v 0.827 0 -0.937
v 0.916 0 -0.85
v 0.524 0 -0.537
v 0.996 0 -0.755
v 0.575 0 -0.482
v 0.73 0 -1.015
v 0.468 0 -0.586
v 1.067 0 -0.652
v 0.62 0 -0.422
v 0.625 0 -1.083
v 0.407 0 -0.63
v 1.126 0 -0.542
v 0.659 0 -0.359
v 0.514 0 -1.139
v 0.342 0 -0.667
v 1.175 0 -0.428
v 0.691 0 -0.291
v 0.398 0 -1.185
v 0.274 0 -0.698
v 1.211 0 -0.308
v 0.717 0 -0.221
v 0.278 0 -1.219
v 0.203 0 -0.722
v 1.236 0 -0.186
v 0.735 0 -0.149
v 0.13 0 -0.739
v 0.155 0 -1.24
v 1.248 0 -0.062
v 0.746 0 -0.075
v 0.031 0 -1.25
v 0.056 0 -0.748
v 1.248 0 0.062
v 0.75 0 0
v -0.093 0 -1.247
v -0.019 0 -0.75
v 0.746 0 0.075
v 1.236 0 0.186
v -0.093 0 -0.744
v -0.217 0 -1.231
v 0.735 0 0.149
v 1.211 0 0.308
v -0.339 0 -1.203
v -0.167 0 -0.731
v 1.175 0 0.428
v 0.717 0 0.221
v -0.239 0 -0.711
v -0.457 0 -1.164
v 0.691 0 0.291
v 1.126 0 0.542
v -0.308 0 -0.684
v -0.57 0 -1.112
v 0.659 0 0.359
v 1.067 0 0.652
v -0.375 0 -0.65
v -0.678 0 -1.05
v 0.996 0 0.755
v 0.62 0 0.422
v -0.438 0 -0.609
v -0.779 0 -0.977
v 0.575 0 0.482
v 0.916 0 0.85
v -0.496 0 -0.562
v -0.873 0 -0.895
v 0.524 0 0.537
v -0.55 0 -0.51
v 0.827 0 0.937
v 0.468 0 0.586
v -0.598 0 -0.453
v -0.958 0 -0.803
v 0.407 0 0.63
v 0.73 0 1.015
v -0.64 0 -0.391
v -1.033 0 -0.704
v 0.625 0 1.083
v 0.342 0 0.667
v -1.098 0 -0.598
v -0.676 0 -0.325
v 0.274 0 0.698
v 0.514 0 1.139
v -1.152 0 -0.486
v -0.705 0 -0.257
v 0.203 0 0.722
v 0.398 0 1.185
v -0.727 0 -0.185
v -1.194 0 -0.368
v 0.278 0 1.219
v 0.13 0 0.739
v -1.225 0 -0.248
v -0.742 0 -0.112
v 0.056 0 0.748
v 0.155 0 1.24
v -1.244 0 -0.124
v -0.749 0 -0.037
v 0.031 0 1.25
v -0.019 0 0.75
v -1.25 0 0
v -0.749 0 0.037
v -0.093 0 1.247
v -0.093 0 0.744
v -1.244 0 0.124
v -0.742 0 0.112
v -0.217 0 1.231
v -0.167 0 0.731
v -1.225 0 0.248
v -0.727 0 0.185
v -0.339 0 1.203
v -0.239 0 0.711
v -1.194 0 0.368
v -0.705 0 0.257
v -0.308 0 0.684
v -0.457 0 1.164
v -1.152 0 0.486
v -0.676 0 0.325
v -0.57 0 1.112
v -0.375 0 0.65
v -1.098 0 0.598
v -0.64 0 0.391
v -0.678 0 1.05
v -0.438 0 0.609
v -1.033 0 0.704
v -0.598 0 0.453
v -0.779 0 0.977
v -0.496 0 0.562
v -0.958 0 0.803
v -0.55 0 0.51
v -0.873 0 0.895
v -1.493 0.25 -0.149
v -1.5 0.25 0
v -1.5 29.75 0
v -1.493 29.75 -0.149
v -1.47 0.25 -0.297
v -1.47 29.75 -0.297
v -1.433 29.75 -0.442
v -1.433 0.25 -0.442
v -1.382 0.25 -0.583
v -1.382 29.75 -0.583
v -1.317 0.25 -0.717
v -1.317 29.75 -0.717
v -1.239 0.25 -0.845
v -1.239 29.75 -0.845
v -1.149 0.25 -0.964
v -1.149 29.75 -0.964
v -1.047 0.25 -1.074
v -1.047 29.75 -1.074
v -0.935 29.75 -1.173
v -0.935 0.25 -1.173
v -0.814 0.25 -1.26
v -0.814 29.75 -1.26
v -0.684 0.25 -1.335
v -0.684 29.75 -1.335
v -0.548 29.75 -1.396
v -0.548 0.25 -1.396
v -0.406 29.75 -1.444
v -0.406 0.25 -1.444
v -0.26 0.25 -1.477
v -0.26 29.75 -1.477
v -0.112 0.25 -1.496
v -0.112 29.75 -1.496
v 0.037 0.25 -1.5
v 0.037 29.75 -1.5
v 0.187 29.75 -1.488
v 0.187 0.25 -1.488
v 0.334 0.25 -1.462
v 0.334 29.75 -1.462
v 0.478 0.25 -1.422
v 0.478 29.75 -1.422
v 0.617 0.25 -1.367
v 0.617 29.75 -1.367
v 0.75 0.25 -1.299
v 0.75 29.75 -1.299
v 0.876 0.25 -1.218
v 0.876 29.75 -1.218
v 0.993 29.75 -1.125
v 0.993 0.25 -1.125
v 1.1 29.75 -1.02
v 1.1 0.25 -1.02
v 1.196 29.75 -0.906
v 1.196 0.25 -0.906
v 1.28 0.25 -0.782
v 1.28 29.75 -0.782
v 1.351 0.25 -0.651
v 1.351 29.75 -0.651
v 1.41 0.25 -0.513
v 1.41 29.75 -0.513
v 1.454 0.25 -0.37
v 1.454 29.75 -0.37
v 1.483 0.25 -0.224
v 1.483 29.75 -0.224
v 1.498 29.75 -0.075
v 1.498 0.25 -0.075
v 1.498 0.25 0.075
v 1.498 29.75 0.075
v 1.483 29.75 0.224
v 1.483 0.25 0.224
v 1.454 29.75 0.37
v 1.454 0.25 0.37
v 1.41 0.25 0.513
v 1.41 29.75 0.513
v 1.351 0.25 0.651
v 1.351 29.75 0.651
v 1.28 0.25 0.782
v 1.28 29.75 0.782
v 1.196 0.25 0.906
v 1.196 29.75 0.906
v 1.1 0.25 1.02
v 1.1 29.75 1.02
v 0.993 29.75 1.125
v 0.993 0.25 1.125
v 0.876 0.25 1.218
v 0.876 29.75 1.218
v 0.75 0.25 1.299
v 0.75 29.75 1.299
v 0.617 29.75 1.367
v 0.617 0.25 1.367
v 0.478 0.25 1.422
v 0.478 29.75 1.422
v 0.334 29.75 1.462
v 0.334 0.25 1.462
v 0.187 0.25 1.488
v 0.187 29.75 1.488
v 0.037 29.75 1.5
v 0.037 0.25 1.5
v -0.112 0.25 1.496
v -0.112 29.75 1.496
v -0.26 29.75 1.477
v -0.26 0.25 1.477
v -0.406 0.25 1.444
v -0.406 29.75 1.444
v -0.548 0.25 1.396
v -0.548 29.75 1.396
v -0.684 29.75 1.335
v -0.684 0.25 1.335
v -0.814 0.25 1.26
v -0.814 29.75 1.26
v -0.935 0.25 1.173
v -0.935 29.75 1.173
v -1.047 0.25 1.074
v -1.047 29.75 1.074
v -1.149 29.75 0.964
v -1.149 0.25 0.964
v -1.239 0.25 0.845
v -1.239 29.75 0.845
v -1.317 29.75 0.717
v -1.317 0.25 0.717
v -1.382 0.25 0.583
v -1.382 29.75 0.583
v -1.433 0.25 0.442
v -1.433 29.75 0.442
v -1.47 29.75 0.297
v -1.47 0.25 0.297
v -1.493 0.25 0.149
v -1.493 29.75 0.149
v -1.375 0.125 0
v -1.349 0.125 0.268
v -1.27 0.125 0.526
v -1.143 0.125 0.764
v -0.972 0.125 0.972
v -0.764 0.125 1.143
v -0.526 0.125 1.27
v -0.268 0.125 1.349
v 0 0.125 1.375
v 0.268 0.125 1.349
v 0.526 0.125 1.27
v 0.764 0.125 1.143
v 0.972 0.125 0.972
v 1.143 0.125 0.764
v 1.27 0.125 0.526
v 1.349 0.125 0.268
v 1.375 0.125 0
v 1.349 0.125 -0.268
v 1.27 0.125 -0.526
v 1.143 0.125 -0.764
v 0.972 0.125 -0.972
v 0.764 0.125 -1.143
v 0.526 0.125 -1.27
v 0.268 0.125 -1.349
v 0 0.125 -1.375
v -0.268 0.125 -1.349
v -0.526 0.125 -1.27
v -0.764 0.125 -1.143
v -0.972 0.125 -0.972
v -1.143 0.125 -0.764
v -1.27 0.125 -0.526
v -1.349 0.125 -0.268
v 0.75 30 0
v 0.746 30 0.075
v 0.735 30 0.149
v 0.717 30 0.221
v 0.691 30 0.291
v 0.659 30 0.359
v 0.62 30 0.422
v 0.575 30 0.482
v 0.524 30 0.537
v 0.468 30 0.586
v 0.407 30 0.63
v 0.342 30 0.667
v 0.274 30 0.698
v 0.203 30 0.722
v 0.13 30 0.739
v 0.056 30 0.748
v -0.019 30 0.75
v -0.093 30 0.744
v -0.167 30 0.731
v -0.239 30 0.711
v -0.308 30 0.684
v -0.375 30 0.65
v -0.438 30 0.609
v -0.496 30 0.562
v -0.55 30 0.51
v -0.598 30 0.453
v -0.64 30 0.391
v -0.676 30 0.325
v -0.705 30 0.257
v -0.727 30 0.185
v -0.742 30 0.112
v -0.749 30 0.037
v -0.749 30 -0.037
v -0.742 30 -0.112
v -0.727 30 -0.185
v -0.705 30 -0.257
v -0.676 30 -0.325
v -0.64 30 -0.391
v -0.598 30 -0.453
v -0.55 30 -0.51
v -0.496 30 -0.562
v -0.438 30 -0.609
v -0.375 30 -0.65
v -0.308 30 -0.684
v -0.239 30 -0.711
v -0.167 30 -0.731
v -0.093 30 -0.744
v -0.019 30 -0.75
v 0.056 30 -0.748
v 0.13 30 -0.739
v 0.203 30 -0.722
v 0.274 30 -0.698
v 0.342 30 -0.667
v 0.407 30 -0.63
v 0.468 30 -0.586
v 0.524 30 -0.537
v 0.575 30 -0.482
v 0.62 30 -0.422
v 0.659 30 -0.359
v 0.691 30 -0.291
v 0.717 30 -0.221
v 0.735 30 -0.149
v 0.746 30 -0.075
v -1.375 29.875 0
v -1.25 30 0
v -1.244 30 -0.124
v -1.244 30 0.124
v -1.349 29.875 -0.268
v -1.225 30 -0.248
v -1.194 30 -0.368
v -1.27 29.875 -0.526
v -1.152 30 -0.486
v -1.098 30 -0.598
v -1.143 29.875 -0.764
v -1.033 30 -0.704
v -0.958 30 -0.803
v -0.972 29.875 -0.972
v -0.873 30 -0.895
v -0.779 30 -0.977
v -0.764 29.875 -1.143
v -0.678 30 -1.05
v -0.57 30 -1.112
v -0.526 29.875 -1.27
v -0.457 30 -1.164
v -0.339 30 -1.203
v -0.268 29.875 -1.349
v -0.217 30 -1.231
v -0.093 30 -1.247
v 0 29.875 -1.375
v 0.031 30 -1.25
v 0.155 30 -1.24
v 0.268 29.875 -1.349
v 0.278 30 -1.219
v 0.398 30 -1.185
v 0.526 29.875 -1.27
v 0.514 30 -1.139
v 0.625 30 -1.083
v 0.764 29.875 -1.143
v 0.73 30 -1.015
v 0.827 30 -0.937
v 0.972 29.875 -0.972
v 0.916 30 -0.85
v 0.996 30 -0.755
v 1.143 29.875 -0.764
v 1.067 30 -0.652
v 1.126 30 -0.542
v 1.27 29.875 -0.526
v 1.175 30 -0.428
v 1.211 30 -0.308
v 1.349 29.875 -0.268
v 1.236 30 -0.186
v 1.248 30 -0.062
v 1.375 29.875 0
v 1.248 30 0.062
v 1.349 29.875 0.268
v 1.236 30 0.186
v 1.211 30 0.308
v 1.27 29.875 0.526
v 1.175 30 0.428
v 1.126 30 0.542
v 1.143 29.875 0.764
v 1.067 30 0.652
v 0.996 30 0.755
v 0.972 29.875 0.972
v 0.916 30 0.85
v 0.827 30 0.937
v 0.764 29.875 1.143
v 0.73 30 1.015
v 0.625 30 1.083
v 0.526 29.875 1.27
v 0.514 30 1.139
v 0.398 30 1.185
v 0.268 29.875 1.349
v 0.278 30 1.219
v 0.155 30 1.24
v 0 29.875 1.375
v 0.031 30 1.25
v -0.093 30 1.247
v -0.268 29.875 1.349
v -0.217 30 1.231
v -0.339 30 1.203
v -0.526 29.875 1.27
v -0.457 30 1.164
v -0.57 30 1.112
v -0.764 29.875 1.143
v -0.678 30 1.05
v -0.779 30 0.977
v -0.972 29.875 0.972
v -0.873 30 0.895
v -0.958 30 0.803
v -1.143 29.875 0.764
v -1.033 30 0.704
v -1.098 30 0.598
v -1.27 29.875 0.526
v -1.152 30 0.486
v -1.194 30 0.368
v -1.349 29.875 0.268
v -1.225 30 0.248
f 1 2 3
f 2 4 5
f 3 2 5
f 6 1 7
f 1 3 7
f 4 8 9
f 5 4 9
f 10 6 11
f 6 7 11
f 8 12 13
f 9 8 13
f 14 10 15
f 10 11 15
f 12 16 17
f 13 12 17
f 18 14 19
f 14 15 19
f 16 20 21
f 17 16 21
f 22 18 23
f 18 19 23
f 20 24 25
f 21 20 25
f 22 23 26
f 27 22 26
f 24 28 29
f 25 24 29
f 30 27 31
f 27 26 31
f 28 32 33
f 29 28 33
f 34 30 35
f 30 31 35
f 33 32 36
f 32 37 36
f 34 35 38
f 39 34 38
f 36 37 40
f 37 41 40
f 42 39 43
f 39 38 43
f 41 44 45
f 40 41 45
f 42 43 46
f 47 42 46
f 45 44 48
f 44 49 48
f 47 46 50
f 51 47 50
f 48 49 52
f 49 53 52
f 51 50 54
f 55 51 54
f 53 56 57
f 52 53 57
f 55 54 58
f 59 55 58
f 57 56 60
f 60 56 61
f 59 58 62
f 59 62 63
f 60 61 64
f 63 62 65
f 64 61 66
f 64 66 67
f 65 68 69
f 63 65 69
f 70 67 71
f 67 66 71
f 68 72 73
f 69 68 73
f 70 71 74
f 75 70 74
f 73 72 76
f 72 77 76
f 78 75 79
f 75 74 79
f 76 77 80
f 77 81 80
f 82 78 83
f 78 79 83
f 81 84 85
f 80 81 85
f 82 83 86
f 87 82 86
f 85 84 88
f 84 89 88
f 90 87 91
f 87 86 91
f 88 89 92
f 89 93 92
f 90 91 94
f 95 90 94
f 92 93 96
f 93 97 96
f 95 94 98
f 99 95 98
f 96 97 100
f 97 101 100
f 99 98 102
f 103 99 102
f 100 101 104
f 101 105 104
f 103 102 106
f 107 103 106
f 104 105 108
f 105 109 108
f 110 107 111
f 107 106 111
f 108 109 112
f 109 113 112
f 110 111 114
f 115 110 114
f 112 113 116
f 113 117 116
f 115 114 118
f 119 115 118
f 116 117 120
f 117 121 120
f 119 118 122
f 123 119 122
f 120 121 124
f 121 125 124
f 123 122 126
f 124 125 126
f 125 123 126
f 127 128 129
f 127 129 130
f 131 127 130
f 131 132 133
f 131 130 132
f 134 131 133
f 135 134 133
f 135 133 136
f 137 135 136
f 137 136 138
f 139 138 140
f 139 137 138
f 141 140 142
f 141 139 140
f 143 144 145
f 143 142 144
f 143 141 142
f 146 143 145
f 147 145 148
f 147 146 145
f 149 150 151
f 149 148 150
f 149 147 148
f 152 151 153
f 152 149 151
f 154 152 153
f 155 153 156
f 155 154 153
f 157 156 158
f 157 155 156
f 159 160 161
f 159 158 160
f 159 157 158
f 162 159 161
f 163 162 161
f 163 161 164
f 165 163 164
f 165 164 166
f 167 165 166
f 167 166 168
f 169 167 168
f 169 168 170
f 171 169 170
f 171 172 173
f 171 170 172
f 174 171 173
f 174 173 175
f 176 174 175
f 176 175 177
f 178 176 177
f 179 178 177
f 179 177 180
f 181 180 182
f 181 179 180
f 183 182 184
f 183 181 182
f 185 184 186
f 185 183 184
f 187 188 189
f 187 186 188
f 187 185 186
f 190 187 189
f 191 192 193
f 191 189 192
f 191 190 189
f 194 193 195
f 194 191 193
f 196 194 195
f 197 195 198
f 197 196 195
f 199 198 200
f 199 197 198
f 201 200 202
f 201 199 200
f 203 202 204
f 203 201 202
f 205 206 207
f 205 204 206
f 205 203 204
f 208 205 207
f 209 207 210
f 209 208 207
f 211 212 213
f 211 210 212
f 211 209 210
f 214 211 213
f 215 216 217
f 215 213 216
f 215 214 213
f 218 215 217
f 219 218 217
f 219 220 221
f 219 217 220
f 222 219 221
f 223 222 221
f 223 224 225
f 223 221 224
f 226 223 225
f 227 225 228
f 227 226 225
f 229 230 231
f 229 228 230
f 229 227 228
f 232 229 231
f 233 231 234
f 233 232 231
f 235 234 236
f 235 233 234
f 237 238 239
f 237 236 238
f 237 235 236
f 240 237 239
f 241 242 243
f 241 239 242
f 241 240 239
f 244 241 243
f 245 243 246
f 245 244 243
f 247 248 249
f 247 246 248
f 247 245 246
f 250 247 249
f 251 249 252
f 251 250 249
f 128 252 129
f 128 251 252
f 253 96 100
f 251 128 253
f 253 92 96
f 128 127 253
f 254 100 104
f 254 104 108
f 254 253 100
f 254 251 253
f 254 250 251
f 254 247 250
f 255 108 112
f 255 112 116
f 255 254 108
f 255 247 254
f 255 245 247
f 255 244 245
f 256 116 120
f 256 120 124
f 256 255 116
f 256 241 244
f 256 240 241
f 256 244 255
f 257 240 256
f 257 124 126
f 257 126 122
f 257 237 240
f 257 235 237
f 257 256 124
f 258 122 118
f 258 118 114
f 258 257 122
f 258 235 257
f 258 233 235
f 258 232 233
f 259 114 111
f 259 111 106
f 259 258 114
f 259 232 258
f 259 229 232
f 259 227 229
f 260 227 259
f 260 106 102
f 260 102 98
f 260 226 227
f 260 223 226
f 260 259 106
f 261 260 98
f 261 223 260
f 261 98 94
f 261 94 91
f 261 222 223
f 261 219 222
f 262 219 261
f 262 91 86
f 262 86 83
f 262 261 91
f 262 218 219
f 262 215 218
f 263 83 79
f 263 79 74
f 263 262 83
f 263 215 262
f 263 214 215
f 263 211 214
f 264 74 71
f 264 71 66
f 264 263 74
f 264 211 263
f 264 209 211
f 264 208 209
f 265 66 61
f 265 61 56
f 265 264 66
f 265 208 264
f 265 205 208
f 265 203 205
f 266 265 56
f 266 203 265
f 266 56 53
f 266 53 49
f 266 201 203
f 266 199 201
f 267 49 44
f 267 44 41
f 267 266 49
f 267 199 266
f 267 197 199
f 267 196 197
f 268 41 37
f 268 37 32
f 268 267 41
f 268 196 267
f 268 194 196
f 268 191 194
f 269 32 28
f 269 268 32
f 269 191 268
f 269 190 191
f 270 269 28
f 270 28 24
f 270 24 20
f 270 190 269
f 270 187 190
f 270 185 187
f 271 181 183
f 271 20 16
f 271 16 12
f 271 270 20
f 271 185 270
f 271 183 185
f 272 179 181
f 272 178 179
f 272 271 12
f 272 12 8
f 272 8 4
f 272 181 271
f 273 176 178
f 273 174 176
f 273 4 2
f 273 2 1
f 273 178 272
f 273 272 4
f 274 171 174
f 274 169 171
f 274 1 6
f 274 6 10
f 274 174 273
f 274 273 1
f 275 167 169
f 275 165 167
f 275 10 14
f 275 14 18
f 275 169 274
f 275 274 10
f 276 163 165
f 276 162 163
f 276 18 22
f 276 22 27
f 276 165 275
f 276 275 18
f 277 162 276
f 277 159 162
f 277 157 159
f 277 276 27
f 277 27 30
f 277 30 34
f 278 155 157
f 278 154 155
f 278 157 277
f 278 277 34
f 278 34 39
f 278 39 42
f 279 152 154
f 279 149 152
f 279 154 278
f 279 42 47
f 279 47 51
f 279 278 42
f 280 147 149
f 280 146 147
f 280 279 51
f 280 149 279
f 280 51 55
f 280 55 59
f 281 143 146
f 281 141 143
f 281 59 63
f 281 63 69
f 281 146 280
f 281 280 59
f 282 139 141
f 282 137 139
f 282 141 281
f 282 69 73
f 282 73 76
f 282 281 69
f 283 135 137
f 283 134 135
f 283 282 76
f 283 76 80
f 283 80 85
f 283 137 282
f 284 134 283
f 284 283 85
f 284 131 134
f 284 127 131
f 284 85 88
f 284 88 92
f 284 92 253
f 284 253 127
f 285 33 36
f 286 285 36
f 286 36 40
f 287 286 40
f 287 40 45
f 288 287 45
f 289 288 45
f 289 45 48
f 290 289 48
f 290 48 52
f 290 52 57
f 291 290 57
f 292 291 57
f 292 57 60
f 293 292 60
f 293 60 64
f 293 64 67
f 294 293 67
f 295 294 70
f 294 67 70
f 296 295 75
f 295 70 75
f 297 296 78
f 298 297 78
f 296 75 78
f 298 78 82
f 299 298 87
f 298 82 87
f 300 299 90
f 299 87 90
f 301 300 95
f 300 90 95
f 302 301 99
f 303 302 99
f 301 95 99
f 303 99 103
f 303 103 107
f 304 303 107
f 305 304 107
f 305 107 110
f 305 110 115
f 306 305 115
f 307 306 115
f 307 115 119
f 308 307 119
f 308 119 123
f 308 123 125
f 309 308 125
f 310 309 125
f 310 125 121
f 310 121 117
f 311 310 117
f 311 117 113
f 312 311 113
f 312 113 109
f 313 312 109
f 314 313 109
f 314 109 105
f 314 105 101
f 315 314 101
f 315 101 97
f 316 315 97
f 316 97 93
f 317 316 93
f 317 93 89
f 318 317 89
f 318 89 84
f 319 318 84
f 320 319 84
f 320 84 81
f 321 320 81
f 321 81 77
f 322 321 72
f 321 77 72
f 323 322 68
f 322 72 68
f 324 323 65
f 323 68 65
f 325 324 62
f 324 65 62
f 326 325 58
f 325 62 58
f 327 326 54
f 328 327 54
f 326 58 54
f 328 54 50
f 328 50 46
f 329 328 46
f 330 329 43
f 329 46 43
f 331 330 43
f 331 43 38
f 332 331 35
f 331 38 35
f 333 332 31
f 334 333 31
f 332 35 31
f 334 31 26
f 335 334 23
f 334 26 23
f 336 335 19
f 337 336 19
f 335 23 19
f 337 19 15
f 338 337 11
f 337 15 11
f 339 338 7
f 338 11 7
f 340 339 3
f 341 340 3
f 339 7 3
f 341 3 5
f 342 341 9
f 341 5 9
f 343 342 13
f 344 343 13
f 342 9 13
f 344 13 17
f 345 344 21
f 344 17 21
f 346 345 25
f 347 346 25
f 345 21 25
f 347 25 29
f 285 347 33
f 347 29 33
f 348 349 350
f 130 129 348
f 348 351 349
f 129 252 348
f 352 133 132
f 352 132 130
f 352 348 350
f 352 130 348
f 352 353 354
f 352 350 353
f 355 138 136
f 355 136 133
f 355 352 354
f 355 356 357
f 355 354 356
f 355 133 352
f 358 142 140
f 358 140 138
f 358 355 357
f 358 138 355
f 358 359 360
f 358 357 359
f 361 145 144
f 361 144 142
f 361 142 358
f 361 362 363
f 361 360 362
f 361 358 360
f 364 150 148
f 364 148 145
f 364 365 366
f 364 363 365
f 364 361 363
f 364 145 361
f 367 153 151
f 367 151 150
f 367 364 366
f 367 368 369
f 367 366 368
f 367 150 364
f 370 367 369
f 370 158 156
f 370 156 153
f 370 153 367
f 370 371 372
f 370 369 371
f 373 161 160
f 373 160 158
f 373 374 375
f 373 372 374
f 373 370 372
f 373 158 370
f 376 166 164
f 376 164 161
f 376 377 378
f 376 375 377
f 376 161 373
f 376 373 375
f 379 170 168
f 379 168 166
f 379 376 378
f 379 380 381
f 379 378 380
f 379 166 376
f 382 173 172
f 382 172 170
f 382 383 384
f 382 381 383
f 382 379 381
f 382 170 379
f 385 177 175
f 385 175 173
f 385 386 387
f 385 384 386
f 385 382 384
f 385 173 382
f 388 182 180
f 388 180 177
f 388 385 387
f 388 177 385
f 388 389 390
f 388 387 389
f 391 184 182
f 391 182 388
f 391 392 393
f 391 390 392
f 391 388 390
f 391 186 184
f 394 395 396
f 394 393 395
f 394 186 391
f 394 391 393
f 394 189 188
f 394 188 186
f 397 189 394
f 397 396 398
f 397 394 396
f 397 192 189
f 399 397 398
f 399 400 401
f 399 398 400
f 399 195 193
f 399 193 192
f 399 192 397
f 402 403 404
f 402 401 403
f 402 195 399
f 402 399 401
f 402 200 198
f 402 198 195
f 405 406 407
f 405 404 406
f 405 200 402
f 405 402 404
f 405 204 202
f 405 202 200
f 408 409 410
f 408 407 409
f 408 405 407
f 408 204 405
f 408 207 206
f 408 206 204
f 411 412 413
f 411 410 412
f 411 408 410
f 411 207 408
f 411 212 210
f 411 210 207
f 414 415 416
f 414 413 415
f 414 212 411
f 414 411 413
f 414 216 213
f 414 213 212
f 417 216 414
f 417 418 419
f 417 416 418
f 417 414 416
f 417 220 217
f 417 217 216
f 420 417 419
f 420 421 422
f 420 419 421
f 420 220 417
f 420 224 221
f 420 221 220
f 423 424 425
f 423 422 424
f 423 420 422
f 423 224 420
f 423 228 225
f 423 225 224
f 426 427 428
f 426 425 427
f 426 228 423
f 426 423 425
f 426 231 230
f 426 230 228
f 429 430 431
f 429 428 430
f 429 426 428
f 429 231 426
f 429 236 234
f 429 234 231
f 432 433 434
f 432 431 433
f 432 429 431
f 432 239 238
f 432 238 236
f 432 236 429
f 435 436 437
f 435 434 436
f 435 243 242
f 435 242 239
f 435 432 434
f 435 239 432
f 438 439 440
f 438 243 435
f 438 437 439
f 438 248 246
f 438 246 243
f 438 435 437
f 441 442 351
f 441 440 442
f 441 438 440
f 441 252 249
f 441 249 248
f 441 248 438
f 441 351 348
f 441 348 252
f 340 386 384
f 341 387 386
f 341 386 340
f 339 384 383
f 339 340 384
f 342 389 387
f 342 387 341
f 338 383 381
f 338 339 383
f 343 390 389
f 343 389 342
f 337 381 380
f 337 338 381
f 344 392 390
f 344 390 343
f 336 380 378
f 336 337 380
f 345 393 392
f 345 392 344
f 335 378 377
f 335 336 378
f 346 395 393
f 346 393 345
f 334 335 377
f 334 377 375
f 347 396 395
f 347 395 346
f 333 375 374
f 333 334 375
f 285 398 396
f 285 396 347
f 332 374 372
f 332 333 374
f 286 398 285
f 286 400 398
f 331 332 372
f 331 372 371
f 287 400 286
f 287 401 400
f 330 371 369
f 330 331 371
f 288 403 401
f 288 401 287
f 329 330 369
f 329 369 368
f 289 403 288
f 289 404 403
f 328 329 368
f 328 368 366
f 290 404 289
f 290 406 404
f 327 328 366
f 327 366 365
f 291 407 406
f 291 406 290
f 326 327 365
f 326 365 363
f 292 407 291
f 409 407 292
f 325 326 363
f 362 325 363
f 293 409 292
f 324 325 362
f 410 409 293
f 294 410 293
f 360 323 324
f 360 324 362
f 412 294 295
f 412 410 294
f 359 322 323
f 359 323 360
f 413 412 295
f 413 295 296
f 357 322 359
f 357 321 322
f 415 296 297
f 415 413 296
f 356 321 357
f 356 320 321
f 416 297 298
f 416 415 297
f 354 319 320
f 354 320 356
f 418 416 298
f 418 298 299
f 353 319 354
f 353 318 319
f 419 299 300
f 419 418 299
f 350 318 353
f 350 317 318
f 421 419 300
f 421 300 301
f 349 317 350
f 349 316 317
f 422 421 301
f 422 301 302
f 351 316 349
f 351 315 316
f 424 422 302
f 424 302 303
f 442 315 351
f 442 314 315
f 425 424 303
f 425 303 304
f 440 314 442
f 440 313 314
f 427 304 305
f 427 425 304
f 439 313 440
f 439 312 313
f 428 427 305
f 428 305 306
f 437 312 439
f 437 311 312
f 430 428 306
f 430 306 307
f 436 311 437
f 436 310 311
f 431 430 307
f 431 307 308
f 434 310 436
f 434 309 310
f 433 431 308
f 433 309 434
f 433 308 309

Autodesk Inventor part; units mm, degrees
ref_plane "YZ Plane" through (0, 0, 0) normal (1, 0, 0) x (0, 1, 0)
ref_plane "XZ Plane" through (0, 0, 0) normal (0, 1, 0) x (-1, 0, 0)
ref_plane "XY Plane" through (0, 0, 0) normal (0, 0, 1) x (1, 0, 0)
sketch "Sketch1" plane through (0, 0, 0) normal (0, 1, 0) x (-1, 0, 0)
  circle A0 centre (0, 0) radius 1.5
  dimension "d0" = 3
extrude "Extrusion1" add sketch "Sketch1" along normal blind 30
chamfer "Chamfer1" distance 0.25 angle 45 2 edges at (1.5, 30, 0) (1.5, 0, 0)
sketch "Sketch2" plane through (0, 0, 0) normal (0, -1, 0) x (1, 0, 0)
  circle A0 centre (0, 0) radius 0.75
  dimension "d6" = 1.5
extrude "Extrusion2" cut sketch "Sketch2" against normal blind 30
properties part number "pin_3_30"
